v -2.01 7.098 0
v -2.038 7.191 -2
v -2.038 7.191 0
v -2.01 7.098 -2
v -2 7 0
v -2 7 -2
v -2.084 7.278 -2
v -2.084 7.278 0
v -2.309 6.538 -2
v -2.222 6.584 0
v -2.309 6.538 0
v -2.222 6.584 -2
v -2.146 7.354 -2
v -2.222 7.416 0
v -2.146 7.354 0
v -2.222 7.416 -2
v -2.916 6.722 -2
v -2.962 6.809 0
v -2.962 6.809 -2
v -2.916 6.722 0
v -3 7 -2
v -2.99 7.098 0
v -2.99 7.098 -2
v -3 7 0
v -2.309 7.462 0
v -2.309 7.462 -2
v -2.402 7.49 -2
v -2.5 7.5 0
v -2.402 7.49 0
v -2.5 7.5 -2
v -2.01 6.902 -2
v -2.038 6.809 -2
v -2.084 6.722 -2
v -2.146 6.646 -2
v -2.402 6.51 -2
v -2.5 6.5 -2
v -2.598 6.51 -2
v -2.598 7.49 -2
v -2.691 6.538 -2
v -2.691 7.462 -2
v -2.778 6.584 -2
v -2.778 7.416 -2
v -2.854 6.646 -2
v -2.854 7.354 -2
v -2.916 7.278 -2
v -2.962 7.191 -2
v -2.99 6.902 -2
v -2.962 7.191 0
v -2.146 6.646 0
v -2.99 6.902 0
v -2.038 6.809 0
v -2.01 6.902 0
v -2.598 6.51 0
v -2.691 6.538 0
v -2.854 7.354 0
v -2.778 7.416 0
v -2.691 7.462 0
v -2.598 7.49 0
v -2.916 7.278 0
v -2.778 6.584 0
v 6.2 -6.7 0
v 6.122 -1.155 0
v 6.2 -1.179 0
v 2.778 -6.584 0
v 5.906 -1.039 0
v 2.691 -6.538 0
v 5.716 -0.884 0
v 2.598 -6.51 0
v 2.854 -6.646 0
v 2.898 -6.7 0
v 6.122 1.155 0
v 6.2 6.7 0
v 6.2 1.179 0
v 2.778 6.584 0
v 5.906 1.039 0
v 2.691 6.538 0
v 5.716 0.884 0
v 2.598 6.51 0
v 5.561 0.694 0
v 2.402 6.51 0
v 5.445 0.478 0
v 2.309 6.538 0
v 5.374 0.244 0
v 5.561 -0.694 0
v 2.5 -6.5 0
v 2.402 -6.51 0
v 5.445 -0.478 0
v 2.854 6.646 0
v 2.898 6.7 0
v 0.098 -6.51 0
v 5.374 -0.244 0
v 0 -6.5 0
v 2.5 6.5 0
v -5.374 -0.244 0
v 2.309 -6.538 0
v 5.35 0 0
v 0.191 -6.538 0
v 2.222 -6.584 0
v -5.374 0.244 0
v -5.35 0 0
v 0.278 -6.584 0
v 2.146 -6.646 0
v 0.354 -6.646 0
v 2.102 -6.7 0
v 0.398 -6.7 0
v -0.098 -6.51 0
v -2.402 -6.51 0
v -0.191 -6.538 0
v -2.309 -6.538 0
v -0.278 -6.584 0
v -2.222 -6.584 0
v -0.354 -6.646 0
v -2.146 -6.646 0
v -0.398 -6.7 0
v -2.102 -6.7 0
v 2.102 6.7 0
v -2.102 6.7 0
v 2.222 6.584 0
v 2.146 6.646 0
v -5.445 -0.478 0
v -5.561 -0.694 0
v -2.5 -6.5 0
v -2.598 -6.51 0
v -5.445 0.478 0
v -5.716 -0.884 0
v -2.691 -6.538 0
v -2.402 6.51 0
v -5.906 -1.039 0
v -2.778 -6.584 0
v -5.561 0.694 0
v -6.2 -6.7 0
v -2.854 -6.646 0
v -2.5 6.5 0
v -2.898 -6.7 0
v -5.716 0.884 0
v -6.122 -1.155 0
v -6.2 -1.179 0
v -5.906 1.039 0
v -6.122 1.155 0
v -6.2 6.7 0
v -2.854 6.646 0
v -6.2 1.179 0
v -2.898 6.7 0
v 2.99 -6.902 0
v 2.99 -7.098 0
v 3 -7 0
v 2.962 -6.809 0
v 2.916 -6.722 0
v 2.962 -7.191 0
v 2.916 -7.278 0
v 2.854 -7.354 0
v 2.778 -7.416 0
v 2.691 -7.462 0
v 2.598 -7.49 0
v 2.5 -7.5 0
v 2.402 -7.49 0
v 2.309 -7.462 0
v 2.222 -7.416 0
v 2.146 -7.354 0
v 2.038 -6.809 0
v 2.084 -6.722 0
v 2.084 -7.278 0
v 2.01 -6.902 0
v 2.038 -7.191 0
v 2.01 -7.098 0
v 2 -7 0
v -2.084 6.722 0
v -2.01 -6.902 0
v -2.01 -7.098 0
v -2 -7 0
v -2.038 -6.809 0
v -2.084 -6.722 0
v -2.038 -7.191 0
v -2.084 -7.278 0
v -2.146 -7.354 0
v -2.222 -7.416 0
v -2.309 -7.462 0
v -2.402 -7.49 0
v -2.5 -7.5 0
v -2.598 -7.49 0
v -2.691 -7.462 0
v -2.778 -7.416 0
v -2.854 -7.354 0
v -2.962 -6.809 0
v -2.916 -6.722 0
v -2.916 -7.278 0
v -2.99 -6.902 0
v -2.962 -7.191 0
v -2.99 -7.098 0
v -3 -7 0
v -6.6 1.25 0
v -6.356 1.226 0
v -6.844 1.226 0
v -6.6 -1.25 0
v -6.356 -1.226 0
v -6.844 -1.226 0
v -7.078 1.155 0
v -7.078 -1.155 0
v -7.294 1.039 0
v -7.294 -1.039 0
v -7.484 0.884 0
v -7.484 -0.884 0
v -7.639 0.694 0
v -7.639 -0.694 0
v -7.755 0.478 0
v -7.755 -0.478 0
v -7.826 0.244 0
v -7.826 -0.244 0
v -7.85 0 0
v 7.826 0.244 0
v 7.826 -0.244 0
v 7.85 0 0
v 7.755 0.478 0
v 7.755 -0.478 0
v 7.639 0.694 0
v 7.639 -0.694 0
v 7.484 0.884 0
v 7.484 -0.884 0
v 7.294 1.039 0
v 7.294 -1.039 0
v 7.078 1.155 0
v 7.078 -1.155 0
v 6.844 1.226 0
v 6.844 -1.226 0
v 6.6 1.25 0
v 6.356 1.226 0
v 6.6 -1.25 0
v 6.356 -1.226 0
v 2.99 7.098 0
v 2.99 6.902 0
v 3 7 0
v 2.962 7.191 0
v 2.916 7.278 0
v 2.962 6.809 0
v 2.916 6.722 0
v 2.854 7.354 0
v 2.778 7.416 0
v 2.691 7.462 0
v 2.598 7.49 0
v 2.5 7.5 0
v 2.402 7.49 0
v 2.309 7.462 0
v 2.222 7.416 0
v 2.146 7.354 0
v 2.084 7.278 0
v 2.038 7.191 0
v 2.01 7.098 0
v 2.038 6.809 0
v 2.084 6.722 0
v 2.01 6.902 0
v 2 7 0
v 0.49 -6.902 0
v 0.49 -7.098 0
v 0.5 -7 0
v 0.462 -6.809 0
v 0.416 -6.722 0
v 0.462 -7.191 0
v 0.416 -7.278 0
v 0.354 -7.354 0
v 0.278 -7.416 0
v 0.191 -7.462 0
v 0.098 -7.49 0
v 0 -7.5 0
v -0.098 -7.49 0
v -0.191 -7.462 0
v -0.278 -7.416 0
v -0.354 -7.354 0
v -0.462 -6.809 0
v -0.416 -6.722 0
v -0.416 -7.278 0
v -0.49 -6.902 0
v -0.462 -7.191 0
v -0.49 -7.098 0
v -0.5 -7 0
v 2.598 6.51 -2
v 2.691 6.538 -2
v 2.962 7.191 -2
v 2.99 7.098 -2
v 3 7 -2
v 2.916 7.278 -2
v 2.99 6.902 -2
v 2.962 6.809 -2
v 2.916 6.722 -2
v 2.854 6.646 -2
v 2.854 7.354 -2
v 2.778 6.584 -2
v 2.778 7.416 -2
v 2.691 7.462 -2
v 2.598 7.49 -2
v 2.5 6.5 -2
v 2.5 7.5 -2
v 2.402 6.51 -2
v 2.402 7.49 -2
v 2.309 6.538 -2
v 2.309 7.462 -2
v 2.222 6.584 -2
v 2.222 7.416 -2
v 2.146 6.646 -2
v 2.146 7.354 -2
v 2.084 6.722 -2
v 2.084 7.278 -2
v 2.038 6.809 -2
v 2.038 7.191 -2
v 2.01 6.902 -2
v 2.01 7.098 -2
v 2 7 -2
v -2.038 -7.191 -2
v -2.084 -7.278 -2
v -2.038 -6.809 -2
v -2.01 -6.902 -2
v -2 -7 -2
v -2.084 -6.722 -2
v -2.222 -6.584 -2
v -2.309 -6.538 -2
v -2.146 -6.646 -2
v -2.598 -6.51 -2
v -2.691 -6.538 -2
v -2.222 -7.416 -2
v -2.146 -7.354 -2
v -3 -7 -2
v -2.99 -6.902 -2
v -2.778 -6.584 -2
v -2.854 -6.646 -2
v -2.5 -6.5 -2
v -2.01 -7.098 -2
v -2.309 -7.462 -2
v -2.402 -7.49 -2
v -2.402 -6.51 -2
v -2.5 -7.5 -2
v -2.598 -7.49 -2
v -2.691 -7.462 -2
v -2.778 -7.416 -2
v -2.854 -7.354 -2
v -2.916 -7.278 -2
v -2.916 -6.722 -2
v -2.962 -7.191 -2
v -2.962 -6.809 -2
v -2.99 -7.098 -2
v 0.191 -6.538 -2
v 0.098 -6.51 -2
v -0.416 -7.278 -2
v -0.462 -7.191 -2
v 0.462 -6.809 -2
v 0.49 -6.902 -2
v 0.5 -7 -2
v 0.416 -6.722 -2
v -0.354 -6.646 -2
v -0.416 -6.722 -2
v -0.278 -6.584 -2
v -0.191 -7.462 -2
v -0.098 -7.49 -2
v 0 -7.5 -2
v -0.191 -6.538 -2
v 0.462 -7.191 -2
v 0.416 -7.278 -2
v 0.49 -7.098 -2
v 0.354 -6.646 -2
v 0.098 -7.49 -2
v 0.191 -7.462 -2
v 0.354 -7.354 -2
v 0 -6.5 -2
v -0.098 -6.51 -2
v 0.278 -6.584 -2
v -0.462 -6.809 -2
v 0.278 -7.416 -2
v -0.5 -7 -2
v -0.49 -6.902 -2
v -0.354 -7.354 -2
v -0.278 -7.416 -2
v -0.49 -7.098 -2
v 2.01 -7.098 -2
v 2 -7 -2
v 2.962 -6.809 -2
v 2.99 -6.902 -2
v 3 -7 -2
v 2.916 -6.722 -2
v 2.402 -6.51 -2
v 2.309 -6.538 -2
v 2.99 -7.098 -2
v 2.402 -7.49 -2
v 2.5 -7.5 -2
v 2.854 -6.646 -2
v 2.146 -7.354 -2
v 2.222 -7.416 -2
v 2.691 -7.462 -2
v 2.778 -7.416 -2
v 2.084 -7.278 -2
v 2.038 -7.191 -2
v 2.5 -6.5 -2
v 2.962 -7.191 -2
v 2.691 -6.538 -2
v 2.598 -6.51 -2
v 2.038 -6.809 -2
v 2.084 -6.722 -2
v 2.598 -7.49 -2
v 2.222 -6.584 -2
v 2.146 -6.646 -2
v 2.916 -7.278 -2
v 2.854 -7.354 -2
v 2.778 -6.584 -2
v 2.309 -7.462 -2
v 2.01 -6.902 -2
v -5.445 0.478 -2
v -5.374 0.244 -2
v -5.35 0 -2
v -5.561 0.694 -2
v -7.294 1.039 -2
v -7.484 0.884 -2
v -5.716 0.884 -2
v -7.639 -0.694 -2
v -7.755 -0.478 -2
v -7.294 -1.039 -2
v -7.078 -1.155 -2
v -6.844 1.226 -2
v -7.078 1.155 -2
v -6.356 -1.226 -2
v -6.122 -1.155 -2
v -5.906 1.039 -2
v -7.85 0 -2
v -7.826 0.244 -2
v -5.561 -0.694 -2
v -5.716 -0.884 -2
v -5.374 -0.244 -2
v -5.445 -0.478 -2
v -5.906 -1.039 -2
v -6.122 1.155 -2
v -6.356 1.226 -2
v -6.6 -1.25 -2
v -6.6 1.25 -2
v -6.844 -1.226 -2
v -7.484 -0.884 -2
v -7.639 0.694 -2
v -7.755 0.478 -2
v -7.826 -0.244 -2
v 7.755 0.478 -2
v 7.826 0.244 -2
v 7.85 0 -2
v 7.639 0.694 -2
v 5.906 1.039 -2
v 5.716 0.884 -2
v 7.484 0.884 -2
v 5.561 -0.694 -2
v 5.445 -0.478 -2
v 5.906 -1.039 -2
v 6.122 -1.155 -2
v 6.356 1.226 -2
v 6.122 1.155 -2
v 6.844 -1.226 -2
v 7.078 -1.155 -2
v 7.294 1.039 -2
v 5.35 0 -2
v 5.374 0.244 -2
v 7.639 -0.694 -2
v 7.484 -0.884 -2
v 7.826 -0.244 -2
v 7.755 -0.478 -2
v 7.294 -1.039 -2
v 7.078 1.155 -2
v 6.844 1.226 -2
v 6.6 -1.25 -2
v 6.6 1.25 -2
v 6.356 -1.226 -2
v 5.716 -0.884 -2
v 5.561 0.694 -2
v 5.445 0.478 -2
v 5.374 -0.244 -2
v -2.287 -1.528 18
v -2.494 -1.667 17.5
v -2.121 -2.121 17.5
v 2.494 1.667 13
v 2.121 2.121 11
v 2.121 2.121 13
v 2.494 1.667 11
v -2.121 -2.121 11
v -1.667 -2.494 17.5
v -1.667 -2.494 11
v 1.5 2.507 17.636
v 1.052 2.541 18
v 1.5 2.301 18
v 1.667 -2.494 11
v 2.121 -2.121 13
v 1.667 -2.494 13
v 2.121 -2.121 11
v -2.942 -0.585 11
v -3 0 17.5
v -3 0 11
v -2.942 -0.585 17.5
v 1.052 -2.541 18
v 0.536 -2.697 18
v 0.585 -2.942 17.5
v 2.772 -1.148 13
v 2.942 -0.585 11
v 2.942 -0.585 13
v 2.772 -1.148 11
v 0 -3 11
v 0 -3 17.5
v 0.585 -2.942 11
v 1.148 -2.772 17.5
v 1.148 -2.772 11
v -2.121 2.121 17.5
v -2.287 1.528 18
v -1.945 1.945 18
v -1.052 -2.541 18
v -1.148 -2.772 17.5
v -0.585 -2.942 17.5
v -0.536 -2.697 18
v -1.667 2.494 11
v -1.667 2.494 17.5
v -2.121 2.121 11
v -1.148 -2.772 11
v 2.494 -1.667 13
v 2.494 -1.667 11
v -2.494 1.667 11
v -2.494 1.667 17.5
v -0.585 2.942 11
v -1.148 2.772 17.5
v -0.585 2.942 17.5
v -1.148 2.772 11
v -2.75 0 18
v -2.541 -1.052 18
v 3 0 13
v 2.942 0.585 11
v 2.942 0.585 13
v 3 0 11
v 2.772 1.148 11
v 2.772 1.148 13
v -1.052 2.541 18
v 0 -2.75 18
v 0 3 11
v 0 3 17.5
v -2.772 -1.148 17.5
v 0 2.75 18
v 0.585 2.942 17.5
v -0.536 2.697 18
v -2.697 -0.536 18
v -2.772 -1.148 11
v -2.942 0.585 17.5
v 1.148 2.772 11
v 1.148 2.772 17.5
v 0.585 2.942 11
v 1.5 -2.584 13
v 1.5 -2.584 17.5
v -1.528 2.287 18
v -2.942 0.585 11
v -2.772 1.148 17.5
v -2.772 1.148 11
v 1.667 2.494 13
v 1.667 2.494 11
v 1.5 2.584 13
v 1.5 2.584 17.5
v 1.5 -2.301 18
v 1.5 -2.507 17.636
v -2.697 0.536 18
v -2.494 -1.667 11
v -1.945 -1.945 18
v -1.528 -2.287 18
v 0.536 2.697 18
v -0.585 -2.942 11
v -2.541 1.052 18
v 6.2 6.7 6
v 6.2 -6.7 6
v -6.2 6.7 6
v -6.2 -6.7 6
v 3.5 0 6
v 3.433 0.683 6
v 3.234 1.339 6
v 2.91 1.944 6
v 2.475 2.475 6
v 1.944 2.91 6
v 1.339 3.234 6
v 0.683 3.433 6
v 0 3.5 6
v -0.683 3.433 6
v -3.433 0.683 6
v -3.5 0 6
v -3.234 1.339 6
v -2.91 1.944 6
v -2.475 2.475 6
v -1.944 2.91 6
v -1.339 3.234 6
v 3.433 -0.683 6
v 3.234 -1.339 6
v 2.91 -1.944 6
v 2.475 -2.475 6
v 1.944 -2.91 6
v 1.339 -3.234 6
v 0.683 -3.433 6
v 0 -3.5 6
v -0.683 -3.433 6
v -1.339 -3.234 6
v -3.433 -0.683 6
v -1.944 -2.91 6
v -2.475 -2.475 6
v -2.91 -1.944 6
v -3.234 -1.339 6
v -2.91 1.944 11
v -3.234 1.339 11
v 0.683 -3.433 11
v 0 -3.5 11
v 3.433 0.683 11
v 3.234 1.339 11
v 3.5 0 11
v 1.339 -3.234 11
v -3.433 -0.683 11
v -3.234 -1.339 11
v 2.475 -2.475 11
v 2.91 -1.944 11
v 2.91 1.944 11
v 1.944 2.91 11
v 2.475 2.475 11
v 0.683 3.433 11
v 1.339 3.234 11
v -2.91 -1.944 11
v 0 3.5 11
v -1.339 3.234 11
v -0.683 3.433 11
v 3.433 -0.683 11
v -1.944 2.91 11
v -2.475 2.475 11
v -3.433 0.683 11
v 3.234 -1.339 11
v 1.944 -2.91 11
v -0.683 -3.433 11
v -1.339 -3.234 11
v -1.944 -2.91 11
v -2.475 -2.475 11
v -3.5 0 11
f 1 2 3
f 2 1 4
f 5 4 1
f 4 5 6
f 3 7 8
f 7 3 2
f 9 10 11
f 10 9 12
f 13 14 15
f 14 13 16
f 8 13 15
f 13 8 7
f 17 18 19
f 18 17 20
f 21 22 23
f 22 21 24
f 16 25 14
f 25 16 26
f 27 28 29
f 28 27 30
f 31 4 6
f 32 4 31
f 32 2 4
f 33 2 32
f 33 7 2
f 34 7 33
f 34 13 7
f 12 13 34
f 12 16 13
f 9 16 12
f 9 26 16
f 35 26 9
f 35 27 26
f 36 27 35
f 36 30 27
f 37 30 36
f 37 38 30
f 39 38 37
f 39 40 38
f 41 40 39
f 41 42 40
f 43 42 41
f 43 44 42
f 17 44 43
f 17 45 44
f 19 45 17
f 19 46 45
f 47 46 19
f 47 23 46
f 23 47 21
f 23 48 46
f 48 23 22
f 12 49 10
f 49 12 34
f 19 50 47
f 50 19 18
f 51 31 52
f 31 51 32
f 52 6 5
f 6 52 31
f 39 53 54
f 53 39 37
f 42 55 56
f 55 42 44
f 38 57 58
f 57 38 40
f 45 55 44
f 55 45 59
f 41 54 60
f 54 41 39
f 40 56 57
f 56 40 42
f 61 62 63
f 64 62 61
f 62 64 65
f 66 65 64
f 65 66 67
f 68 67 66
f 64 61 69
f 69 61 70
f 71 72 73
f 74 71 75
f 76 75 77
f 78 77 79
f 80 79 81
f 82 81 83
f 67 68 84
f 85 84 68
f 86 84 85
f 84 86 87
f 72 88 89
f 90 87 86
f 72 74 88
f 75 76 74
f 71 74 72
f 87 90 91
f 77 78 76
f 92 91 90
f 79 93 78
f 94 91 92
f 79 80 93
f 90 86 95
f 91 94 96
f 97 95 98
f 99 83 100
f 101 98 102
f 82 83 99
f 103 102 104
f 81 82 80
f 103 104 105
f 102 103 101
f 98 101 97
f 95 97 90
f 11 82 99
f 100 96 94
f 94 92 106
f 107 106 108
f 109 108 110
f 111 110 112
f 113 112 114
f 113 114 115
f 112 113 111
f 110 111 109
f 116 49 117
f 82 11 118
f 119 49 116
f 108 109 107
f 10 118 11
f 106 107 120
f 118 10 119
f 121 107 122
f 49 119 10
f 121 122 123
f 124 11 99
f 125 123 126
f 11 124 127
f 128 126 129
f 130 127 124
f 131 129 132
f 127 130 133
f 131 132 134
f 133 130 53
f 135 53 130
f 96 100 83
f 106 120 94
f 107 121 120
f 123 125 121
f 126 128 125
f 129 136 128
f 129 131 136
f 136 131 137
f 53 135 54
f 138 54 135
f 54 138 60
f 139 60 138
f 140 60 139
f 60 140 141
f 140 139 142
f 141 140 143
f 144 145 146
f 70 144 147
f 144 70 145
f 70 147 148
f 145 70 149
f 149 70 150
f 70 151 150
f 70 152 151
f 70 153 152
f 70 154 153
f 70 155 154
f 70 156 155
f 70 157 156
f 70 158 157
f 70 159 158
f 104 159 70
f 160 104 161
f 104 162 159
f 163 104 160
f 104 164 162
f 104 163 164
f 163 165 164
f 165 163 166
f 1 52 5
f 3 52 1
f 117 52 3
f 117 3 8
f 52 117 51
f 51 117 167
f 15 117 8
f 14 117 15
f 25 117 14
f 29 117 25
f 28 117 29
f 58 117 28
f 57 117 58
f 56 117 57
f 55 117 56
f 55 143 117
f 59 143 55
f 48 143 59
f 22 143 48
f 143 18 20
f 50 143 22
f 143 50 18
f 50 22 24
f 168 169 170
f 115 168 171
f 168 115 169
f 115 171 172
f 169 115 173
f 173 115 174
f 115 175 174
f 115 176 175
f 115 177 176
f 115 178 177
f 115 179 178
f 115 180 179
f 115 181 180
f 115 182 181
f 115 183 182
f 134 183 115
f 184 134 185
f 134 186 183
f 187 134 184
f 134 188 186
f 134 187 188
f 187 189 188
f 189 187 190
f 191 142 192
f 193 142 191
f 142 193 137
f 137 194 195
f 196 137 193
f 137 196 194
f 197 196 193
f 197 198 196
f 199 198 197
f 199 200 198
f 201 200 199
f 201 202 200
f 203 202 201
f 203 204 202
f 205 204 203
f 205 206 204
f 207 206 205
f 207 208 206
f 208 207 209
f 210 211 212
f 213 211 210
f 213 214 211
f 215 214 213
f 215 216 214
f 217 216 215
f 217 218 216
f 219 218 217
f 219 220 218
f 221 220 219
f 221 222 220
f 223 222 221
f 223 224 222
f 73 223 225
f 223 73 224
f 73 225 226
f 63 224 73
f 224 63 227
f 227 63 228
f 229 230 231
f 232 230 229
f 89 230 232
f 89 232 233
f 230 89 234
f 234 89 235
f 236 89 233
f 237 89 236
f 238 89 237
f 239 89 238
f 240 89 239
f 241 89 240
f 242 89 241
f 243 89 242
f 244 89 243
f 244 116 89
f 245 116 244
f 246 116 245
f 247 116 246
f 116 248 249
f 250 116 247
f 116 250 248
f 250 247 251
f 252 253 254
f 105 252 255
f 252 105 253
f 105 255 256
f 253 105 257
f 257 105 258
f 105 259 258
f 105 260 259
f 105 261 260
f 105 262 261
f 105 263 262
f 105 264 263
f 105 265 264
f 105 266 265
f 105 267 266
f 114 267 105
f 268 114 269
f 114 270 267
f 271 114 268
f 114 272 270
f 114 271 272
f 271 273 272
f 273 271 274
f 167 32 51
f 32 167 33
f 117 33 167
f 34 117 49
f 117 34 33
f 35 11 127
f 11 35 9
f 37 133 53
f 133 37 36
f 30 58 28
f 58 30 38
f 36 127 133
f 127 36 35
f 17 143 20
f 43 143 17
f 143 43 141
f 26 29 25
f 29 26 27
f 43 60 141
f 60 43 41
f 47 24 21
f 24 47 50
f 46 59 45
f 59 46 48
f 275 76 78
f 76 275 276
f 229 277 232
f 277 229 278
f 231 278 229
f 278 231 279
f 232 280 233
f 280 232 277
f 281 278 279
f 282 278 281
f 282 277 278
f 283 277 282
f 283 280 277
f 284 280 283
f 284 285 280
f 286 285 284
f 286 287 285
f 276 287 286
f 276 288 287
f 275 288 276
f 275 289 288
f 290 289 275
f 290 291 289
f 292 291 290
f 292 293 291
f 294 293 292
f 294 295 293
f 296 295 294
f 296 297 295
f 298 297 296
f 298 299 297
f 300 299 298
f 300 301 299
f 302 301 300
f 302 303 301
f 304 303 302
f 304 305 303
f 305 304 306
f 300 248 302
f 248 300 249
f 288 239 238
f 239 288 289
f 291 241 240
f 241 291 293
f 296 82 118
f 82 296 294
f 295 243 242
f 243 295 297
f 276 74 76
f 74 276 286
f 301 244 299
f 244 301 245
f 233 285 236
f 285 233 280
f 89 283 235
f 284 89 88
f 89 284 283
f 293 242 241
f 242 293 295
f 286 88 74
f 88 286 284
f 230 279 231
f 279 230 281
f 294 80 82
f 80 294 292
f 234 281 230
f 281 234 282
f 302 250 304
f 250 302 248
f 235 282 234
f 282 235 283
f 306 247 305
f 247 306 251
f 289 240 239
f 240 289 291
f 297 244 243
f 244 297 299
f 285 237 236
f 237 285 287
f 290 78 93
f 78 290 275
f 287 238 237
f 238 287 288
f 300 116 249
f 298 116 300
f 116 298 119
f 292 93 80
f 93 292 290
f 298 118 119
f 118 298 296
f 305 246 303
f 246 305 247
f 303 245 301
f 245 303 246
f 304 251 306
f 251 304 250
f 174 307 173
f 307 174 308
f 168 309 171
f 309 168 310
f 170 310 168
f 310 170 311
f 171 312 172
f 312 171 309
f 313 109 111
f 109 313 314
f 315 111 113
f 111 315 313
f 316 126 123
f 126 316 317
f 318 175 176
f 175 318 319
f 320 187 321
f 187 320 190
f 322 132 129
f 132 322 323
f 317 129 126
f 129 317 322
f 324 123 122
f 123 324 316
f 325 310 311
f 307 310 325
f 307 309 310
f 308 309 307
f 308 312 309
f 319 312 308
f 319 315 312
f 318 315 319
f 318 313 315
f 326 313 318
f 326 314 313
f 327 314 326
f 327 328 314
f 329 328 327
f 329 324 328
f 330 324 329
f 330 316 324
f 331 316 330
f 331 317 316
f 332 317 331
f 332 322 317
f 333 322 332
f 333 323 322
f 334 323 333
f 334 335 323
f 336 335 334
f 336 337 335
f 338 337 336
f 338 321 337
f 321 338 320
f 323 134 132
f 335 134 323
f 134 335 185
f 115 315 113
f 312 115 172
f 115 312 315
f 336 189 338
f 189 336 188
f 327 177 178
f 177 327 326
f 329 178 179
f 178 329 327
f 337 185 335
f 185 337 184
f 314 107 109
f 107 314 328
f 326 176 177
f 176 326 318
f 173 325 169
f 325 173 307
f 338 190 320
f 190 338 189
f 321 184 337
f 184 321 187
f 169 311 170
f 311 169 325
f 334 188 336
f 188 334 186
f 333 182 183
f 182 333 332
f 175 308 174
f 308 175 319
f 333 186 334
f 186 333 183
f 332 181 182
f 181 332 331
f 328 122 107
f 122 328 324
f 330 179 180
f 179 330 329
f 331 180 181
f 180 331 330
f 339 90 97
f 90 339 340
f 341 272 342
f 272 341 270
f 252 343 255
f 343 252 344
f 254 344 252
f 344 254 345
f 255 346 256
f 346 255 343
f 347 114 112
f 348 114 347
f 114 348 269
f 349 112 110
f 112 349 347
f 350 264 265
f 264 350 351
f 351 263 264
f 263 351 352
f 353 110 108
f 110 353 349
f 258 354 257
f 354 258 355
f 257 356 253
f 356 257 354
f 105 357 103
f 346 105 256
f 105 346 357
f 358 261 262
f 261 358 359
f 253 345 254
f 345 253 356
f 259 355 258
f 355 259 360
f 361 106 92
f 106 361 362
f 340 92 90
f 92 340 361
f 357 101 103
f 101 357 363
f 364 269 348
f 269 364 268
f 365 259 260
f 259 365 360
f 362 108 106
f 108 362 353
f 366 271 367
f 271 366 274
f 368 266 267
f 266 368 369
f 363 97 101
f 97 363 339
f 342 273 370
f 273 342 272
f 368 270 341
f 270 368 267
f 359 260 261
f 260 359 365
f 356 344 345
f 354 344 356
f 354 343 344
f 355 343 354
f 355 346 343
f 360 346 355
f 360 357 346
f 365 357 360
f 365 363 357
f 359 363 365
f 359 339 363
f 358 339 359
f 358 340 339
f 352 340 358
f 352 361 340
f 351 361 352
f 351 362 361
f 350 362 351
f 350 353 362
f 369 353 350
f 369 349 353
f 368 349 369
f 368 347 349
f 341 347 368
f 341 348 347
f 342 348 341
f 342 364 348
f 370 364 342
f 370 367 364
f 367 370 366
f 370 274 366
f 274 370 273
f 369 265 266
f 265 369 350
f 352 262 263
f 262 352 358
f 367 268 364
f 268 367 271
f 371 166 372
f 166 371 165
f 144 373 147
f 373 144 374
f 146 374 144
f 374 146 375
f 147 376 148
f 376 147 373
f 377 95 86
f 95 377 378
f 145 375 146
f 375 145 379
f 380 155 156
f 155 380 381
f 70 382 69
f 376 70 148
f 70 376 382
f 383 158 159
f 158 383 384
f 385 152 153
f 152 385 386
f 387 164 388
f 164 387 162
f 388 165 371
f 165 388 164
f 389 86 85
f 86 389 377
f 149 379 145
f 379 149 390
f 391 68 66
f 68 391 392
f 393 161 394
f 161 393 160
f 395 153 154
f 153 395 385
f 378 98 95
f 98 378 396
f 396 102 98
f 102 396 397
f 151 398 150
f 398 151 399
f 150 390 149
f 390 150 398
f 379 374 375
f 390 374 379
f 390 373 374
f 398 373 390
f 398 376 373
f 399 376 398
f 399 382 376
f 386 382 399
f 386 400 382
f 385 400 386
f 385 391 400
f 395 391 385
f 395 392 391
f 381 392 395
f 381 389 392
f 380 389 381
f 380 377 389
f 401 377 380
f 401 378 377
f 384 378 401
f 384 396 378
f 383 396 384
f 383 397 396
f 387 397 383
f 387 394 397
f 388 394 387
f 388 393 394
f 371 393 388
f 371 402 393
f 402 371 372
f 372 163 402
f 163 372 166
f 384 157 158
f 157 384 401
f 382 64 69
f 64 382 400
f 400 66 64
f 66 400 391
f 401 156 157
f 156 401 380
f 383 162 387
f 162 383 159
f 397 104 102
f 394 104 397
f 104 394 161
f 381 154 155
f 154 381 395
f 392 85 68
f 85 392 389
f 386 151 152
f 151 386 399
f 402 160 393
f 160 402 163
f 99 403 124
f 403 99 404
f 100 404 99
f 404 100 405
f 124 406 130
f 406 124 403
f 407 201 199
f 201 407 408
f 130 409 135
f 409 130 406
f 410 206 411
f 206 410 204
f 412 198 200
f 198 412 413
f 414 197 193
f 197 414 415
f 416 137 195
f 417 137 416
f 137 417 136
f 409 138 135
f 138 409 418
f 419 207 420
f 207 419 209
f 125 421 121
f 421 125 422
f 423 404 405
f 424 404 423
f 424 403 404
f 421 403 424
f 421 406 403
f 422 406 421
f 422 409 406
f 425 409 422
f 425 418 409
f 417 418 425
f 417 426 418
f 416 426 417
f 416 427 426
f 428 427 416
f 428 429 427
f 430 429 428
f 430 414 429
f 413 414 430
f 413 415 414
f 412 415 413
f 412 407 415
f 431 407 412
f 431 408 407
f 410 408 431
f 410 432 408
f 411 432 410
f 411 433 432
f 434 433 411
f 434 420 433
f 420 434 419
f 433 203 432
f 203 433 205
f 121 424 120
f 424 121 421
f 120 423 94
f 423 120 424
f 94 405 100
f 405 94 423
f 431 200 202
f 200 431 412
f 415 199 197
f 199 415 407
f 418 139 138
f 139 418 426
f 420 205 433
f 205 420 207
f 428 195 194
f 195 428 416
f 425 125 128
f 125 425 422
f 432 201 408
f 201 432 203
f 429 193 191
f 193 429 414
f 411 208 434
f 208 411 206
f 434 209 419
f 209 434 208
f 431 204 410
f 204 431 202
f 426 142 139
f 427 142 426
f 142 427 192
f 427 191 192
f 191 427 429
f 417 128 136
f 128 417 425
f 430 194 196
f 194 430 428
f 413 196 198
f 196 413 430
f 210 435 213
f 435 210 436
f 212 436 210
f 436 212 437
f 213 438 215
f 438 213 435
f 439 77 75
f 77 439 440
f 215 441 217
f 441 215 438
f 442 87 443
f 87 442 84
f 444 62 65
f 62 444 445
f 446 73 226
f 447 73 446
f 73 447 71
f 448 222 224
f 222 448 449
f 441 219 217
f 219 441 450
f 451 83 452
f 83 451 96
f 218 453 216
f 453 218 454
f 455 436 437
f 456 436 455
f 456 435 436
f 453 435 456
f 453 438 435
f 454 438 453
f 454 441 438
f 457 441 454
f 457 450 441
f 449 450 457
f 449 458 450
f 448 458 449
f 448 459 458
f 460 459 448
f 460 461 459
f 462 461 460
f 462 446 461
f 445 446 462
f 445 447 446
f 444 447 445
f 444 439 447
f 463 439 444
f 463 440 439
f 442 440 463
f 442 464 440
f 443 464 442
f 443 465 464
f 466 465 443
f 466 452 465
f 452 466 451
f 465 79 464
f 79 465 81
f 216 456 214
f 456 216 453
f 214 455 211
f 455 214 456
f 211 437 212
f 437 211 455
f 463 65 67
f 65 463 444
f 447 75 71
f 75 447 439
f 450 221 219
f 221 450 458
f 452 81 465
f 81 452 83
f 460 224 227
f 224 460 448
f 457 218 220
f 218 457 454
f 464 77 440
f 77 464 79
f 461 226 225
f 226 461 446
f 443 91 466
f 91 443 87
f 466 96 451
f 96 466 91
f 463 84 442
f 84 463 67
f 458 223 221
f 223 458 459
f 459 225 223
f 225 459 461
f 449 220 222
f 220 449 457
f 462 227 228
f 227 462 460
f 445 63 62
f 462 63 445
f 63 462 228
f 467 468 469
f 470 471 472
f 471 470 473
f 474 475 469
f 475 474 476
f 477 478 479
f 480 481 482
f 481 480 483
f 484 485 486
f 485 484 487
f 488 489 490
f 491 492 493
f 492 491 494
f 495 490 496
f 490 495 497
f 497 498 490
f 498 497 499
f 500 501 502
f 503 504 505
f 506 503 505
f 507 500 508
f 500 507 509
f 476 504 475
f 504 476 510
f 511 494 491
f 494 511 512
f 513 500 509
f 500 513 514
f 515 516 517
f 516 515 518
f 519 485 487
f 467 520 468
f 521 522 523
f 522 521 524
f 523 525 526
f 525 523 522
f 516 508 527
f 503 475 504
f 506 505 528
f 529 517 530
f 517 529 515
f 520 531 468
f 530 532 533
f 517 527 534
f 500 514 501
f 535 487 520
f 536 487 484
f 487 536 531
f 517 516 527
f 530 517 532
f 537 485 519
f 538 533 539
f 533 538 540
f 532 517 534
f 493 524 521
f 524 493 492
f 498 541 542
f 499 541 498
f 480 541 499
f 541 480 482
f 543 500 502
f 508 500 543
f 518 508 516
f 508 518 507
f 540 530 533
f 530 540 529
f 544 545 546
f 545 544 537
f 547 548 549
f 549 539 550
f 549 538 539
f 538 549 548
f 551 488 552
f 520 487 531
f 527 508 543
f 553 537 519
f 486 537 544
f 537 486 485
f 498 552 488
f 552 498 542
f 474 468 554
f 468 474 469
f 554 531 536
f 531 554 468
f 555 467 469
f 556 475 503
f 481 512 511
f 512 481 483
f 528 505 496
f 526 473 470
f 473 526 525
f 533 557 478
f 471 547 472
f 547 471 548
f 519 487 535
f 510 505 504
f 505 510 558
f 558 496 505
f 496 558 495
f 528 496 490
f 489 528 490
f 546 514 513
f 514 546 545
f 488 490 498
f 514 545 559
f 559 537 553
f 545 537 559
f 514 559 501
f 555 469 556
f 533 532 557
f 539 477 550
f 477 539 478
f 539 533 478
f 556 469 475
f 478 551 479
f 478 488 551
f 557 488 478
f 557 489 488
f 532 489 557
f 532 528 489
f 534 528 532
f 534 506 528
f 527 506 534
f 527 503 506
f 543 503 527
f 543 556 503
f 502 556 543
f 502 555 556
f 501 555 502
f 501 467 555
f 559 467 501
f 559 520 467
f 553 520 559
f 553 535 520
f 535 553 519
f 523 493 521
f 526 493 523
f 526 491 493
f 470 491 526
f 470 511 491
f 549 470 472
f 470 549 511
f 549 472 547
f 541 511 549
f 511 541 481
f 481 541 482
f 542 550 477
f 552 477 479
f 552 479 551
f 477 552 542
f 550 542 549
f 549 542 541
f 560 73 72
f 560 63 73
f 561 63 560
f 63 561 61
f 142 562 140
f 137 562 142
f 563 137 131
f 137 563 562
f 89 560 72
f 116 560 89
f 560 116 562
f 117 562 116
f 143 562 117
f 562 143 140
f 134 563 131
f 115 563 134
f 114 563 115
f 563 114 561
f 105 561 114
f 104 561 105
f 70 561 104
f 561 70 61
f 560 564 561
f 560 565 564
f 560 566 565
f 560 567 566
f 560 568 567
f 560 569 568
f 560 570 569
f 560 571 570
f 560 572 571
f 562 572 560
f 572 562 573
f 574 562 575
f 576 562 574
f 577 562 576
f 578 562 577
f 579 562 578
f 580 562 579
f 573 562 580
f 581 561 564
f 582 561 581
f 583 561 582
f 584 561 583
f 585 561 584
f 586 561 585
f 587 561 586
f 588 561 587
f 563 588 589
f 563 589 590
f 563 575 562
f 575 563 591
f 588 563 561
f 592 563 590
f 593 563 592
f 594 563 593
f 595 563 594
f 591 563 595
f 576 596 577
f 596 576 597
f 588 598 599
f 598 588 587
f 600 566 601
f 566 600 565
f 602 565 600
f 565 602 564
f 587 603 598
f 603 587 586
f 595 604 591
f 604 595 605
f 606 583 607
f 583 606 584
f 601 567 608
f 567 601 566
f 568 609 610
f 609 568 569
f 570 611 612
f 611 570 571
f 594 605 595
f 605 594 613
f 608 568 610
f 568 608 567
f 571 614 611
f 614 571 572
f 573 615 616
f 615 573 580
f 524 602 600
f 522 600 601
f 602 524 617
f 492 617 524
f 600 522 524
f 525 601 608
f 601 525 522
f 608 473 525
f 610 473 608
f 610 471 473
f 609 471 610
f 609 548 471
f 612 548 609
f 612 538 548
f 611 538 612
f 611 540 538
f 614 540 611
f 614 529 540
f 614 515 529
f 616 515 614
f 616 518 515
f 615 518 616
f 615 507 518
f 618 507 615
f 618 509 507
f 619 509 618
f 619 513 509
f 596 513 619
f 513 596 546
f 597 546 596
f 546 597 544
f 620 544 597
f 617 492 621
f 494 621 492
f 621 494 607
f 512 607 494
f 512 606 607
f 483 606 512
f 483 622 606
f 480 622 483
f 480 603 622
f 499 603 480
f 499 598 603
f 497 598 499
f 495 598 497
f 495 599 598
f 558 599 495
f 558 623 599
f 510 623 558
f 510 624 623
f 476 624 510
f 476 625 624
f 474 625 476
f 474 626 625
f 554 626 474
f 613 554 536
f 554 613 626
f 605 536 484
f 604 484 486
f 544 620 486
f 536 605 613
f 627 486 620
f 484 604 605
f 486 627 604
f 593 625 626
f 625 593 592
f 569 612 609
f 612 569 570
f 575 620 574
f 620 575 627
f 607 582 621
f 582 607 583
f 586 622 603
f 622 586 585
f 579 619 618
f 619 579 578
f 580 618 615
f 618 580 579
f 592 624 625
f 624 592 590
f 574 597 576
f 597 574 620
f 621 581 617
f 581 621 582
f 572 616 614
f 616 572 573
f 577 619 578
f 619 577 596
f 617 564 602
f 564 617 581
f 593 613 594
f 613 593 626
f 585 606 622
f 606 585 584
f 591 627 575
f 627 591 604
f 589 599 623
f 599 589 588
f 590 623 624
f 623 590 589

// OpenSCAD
/**
 * Martin Egli
 * 2023-08-29
 */

// PEC12R-2220F-S0024
module pec12r_pcbcut(hi1 = 3, loc_res = 32) {
    // 1
    translate([-2.5, 7, 0])
    cylinder(d = 1, h = hi1, $fn = loc_res);
    // 2
    translate([+2.5, 7, 0])
    cylinder(d = 1, h = hi1, $fn = loc_res);
    // A
    translate([-2.5, -7, 0])
    cylinder(d = 1, h = hi1, $fn = loc_res);
    // B
    translate([0, -7, 0])
    cylinder(d = 1, h = hi1, $fn = loc_res);
    // C
    translate([+2.5, -7, 0])
    cylinder(d = 1, h = hi1, $fn = loc_res);
    // case shield
    translate([-13.2/2, 0, 0])
    cylinder(d = 2.5, h = hi1, $fn = loc_res);
    // case shield
    translate([+13.2/2, 0, 0])
    cylinder(d = 2.5, h = hi1, $fn = loc_res);
}
module pec12r(show_cutout = 1, loc_res = 32) {
    if(show_cutout) {
        translate([0, 0, -2])
        pec12r_pcbcut(hi1 = 2);
    }
    color("DarkGray")
    translate([-12.4/2, -13.4/2, 0])
    cube([12.4, 13.4, 6.0]);
    color("LightGray")
    translate([-12.4/2, -13.4/2, 6.0])
    cube([12.4, 13.4, 0.1]);
    color("DarkGray")
    translate([0, 0, 6.0])
    cylinder(d = 7, h = 2, $fn = loc_res);
    color("DarkGray")
    translate([0, 0, 0])
    cylinder(d = 6, h = 15, $fn = loc_res);
}

module en12hs_cutout(hi1 = 3, loc_res = 32) {
    pec12r_pcbcut(hi1, loc_res);
}

// EN12-HS11AF18
module en12hs(show_cutout = 1, loc_res = 32) {
    if(show_cutout) {
        translate([0, 0, -2])
        en12hs_cutout(hi1 = 2);
    }
    color("LightGreen")
    translate([-12.4/2, -13.4/2, 0])
    cube([12.4, 13.4, 5.9]);
    color("LightGray")
    translate([-12.4/2, -13.4/2, 5.9])
    cube([12.4, 13.4, 0.1]);
    color("LightGray")
    translate([0, 0, 6.0])
    cylinder(d = 7, h = 5, $fn = loc_res);
    color("DarkGray")
    difference() {
        hull() {
            translate([0, 0, 0])
            cylinder(d = 6, h = 17.5, $fn = loc_res);
            translate([0, 0, 0])
            cylinder(d = 5.5, h = 18, $fn = loc_res);
        }
        translate([1.5, -3, 18-5])
        cube([6, 6, 6]);
    }
}
en12hs();

module led0505(loc_res = 32) {
    difference() {
        union() {
            color("White")
            translate([-5/2, -5/2, 0])
            cube([5, 5, 1.6]);
            color("Gray")
            translate([0, 0, 1.5])
            cylinder(d = 4, h = 0.2, $fn = loc_res);
        }
        translate([5/2, -5/2-1.5, 1.6-0.2])
        rotate([0, 0, 45])
        cube([2, 2, 0.3]);
    }
}

module ledWS2812B(loc_res = 32) {
    led0505(loc_res);
}

module ledSK6812(loc_res = 32) {
    led0505(loc_res);
}
